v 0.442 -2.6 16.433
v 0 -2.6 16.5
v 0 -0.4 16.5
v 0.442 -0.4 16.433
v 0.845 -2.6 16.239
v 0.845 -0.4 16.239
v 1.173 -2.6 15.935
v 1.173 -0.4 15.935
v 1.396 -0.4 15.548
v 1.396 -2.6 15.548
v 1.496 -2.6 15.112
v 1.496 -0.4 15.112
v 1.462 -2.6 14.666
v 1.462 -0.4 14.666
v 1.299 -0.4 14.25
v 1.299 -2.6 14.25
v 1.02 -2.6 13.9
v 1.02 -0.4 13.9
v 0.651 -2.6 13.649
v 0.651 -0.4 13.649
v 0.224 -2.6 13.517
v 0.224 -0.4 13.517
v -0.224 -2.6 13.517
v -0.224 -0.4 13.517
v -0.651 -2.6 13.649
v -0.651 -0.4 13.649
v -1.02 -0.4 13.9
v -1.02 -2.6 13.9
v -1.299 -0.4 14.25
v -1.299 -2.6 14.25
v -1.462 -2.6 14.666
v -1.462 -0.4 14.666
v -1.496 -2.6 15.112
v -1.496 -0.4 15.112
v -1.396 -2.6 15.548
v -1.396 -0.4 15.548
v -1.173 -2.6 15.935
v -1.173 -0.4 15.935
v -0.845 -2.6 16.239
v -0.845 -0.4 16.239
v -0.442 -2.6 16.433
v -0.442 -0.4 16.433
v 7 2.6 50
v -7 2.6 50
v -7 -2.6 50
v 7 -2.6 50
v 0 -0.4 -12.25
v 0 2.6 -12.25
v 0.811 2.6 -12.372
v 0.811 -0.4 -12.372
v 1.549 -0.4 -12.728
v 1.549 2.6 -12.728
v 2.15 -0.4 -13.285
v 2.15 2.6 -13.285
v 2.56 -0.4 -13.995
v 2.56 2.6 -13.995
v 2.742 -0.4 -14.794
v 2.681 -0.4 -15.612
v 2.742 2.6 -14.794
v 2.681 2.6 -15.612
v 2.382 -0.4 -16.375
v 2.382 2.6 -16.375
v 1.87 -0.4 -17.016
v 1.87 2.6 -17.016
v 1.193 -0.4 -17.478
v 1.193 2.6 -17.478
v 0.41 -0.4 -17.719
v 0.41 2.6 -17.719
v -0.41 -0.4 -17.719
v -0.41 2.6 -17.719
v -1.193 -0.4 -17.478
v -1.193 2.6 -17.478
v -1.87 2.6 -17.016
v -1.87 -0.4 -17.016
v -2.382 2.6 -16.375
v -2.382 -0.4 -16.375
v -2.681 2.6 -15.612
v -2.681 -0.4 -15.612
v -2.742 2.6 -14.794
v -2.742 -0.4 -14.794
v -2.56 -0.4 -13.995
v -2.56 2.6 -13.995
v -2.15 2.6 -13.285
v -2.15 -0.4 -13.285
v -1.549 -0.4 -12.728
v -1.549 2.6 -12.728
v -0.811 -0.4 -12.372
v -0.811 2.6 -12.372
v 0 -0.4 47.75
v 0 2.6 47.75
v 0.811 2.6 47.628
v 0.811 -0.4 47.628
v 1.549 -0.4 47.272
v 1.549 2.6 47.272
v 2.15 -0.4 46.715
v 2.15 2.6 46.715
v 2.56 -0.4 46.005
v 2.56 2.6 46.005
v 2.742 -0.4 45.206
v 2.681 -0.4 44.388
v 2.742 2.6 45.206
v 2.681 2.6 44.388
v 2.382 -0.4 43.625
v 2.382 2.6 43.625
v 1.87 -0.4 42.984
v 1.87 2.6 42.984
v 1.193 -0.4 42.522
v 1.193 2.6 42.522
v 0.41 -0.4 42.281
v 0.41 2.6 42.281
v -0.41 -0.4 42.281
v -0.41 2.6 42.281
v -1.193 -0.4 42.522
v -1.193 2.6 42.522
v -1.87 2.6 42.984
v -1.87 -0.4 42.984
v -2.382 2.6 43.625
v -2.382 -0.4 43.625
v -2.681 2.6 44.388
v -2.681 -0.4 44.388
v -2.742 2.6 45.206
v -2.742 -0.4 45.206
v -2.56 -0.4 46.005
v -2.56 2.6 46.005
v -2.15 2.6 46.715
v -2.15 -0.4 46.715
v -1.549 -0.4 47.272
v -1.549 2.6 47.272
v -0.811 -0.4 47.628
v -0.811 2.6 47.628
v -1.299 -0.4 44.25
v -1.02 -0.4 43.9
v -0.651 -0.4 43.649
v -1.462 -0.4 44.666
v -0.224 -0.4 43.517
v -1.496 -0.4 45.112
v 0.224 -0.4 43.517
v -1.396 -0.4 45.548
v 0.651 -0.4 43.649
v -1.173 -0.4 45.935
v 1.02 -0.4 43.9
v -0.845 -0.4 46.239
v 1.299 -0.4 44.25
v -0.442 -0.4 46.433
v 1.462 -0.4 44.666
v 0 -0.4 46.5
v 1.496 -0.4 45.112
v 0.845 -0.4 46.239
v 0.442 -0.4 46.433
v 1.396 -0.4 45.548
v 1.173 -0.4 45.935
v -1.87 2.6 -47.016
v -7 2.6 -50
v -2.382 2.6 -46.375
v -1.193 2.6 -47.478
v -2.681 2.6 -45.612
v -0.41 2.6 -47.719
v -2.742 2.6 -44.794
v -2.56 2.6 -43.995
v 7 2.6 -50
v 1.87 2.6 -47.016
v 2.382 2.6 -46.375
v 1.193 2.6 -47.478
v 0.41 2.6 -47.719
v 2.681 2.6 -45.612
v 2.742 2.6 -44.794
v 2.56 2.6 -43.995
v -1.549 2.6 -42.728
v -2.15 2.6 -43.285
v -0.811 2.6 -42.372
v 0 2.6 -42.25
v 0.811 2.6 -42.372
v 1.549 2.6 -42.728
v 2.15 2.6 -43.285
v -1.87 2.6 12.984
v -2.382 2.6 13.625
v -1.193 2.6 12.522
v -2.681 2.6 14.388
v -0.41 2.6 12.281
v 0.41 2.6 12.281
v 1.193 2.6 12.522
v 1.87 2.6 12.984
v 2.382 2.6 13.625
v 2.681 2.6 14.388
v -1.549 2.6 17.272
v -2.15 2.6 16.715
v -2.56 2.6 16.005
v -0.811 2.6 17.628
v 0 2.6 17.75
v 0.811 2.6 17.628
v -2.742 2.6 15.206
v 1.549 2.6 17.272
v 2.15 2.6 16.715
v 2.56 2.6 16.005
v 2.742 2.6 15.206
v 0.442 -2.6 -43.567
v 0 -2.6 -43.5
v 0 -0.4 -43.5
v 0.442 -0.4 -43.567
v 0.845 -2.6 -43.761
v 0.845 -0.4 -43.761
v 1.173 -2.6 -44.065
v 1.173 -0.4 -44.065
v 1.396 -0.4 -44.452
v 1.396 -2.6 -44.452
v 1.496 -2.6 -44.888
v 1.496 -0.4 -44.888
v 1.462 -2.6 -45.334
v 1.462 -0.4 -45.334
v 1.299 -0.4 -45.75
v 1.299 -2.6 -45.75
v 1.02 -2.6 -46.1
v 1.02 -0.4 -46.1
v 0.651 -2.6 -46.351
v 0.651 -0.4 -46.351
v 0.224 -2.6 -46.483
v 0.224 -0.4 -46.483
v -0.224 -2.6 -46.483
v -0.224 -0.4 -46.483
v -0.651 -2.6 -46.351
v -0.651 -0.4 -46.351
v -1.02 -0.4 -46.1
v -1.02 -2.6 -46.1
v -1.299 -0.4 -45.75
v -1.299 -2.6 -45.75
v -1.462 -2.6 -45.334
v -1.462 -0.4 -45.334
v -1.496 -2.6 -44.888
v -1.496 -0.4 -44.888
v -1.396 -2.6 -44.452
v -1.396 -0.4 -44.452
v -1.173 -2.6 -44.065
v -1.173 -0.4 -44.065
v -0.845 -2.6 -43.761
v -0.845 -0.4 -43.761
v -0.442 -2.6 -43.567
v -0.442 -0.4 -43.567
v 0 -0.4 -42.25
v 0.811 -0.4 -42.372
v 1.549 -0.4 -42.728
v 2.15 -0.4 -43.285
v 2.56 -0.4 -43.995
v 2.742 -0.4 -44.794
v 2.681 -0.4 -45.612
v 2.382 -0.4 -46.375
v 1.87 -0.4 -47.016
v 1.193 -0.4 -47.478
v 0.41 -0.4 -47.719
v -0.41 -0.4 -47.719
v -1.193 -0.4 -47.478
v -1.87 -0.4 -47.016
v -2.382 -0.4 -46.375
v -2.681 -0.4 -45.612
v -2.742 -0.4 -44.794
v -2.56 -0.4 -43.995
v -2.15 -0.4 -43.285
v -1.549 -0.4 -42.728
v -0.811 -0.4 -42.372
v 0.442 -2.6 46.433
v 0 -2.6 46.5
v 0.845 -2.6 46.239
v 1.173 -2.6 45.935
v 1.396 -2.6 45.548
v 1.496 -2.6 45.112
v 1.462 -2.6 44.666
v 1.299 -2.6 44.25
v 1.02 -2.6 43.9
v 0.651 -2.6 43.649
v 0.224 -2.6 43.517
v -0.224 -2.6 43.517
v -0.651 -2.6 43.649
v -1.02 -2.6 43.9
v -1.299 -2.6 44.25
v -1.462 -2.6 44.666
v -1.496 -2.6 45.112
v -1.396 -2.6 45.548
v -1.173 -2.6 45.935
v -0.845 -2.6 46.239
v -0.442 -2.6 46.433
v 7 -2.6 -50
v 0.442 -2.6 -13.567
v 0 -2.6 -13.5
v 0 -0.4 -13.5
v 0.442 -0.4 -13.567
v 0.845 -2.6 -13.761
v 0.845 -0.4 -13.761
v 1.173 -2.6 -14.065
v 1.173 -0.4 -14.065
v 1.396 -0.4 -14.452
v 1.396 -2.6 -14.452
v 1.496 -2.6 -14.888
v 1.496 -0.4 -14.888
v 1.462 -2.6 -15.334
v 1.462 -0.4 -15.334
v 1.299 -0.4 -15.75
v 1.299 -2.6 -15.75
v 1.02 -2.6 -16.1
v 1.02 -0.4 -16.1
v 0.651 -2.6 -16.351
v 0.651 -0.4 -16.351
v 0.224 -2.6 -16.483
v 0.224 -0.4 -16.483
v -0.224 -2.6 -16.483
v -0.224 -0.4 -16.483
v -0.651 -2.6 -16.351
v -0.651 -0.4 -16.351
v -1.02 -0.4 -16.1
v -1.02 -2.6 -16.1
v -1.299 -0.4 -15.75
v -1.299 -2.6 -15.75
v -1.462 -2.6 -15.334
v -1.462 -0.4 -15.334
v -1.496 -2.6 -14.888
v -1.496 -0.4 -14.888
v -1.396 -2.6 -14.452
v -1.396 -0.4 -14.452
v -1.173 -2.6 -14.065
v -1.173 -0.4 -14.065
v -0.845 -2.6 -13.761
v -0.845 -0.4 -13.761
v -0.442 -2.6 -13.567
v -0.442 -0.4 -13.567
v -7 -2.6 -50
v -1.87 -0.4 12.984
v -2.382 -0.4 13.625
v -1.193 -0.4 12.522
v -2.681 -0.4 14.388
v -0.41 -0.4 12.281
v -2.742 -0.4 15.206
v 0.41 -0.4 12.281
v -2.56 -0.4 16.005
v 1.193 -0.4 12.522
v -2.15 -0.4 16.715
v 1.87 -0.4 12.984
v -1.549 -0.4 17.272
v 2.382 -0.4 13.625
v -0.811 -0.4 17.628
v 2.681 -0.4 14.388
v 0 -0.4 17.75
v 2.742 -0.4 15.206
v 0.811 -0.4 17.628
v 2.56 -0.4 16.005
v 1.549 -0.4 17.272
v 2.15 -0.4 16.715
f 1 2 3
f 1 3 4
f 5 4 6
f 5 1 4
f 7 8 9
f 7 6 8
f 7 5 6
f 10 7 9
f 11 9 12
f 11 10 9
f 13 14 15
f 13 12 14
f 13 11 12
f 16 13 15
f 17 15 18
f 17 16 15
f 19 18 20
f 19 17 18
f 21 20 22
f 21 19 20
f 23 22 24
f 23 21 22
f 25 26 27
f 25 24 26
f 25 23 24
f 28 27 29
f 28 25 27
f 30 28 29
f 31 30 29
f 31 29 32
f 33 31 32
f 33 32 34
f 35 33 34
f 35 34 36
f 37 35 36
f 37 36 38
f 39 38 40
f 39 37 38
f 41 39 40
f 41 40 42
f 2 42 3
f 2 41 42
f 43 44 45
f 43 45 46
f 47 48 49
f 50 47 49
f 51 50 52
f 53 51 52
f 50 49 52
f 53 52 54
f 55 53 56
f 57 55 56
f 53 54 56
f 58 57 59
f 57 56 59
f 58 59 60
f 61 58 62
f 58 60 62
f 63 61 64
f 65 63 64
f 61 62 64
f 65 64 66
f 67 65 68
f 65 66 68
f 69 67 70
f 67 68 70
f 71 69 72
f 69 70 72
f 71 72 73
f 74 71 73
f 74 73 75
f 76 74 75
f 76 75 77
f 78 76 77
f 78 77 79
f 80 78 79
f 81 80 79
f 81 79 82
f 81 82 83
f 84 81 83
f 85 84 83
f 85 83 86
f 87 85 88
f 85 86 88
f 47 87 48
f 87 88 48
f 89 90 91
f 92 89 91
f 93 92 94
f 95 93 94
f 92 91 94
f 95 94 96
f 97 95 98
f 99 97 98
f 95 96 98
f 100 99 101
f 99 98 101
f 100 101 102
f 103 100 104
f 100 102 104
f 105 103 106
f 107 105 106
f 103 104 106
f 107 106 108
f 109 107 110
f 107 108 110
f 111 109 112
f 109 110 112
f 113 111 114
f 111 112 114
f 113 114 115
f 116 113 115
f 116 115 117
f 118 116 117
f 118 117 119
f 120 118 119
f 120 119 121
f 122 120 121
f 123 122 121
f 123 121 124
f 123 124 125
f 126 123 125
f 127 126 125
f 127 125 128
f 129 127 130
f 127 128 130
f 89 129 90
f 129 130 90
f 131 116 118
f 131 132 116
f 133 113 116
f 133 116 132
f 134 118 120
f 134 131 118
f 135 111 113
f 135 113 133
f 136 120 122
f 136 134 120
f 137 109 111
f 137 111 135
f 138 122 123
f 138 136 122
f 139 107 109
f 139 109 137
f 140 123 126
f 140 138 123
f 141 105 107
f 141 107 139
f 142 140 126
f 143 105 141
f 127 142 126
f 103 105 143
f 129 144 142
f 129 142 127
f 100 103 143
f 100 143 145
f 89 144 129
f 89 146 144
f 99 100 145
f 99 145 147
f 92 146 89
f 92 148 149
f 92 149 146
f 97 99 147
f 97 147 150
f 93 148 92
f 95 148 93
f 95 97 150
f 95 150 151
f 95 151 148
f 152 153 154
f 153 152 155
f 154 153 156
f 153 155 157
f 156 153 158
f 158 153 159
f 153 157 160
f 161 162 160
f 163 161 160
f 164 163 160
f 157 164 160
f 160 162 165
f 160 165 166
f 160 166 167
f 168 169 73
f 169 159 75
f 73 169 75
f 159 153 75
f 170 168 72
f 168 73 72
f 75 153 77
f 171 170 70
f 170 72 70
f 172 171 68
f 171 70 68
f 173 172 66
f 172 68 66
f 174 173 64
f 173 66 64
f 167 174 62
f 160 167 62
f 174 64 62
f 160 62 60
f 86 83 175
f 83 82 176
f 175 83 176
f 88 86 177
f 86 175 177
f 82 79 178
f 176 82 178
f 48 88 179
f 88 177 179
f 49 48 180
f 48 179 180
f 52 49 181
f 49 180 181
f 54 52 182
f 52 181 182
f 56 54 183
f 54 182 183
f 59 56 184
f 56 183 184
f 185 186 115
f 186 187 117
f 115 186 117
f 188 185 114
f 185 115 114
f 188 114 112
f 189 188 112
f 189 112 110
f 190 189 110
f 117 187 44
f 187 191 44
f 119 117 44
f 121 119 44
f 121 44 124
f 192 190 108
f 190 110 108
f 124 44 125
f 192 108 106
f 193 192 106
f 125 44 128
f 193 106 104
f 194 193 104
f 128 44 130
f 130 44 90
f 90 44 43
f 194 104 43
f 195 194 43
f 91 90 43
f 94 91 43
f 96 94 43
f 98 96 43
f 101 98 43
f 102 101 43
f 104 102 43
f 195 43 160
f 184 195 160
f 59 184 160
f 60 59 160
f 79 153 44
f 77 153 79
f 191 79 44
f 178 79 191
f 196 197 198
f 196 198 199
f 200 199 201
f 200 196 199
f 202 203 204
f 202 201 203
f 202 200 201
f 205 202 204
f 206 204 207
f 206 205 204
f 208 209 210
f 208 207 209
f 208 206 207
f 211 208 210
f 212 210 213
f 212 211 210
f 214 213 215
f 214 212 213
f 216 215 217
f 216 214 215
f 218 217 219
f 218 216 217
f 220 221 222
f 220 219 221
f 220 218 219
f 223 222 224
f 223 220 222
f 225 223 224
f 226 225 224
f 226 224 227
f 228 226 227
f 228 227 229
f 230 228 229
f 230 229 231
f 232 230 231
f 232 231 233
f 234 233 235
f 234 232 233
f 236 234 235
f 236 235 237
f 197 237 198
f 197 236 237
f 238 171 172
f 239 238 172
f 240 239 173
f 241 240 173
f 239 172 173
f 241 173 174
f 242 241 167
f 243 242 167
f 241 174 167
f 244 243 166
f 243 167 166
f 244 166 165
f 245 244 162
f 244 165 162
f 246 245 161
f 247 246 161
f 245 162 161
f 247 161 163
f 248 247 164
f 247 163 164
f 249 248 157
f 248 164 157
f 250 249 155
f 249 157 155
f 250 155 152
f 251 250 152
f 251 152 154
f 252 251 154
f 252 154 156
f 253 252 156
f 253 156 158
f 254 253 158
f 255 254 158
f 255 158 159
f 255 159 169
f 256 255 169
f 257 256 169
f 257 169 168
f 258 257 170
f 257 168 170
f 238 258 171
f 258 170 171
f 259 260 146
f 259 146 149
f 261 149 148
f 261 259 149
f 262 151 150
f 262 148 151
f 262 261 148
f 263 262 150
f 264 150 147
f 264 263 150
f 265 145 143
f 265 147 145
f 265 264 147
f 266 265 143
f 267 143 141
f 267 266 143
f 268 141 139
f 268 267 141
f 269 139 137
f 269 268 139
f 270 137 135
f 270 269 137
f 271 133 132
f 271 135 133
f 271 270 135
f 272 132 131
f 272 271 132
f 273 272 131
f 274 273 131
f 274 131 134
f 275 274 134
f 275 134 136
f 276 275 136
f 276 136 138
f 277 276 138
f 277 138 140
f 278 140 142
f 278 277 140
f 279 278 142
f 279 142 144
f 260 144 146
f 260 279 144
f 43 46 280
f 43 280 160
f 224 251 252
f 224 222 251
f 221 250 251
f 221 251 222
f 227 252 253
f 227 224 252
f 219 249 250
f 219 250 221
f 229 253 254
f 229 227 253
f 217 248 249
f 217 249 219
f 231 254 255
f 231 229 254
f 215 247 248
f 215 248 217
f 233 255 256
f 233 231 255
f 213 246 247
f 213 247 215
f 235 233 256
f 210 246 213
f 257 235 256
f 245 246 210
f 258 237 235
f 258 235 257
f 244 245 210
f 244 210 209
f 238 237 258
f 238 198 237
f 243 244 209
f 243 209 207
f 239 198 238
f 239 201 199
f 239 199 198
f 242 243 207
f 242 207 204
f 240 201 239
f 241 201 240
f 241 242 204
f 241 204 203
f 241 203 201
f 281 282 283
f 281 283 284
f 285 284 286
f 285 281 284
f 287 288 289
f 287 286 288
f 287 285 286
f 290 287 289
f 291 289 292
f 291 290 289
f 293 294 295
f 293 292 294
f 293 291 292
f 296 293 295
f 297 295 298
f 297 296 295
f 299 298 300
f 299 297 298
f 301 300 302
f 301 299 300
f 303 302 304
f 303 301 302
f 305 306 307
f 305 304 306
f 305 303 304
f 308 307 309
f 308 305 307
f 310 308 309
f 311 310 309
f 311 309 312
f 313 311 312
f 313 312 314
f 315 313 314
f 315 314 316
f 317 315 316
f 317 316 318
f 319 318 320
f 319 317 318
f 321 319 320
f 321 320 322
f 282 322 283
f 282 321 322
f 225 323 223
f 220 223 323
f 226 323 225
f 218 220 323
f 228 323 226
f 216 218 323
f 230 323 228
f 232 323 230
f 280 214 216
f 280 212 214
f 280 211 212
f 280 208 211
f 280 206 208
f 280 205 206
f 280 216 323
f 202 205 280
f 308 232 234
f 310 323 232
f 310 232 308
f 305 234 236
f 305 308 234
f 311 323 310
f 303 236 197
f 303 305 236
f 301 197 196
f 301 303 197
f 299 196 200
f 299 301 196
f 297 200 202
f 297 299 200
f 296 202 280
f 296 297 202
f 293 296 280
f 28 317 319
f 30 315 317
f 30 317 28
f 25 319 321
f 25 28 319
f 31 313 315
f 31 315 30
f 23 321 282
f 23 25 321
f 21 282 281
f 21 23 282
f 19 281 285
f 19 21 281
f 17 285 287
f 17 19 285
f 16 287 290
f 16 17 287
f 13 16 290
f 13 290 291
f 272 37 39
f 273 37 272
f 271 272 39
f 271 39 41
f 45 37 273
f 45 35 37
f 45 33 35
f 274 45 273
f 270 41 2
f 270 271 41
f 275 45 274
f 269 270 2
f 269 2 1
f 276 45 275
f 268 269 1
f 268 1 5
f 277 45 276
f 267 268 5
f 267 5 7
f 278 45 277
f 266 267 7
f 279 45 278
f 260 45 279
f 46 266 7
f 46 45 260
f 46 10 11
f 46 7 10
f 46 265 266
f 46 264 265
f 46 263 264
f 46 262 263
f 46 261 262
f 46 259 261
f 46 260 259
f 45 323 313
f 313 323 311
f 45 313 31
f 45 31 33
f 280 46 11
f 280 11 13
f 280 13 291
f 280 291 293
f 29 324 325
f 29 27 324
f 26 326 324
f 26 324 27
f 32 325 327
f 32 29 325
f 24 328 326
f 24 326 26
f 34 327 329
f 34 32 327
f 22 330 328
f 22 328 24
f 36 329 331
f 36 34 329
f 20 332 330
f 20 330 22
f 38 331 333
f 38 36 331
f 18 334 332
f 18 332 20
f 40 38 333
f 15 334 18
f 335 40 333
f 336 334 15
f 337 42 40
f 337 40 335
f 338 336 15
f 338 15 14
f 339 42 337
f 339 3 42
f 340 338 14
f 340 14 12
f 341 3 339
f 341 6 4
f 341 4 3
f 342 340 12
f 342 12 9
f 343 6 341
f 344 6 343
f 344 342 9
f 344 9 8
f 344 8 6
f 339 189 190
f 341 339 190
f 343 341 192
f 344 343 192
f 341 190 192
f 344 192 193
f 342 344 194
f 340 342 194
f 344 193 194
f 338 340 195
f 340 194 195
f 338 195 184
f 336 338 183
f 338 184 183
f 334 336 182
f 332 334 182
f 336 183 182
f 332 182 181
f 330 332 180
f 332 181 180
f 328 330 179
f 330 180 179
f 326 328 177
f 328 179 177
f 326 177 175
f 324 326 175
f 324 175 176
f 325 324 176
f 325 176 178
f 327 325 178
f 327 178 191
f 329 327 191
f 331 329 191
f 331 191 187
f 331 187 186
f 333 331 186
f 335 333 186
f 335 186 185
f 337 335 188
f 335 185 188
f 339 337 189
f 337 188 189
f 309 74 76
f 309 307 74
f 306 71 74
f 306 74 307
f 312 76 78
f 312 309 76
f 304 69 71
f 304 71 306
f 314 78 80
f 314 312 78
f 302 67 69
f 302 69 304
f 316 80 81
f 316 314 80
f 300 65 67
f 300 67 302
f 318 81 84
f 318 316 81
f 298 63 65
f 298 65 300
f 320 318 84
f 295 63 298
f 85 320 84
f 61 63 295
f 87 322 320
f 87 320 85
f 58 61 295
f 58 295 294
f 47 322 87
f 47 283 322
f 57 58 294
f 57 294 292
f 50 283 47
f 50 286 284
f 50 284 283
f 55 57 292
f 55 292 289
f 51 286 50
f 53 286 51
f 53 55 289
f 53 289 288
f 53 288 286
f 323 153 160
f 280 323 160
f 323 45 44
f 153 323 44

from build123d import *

# Parameters (mm, degrees)
SKETCH_1_W               = 14
SKETCH_1_H               = 5.2
EXTRUDE_1_DEPTH          = 50
SKETCH_3_R               = 2.75
CUT_EXTRUDE_1_DEPTH      = 3
CUT_EXTRUDE_2_DEPTH      = 51.754704215
CUT_EXTRUDE_2_DEPTH_BACK = 51.754704215
SKETCH_4_R               = 1.5


with BuildPart() as part:
    # 草图1 → 凸台-拉伸1 (new, symmetric)
    with BuildSketch(Plane.XY):
        Rectangle(SKETCH_1_W, SKETCH_1_H)
    extrude(amount=EXTRUDE_1_DEPTH, both=True)

    # 草图3 → 切除-拉伸1 (cut)
    with BuildSketch(Plane(origin=(0, 2.6, 0), x_dir=(1, 0, 0), z_dir=(0, 1, 0))):
        with Locations(Location((0, -45, 0), (0, 0, 270))):
            Circle(SKETCH_3_R)
        with Locations(Location((0, -15, 0), (0, 0, 270))):
            Circle(SKETCH_3_R)
        with Locations(Location((0, 15, 0), (0, 0, 270))):
            Circle(SKETCH_3_R)
        with Locations(Location((0, 45, 0), (0, 0, 270))):
            Circle(SKETCH_3_R)
    extrude(amount=-CUT_EXTRUDE_1_DEPTH, mode=Mode.SUBTRACT)

    # 草图4 → 切除-拉伸2 (cut, two sides: drawn at the far end of the back side and taken through both)
    with BuildSketch(Plane(origin=(0, 2.6, 0), x_dir=(1, 0, 0), z_dir=(0, 1, 0)).offset(-CUT_EXTRUDE_2_DEPTH_BACK)):
        with Locations(Location((0, -45, 0), (0, 0, 270))):
            Circle(SKETCH_4_R)
        with Locations(Location((0, -15, 0), (0, 0, 270))):
            Circle(SKETCH_4_R)
        with Locations(Location((0, 15, 0), (0, 0, 270))):
            Circle(SKETCH_4_R)
        with Locations(Location((0, 45, 0), (0, 0, 270))):
            Circle(SKETCH_4_R)
    extrude(amount=CUT_EXTRUDE_2_DEPTH + CUT_EXTRUDE_2_DEPTH_BACK, mode=Mode.SUBTRACT)


solid = part.part
